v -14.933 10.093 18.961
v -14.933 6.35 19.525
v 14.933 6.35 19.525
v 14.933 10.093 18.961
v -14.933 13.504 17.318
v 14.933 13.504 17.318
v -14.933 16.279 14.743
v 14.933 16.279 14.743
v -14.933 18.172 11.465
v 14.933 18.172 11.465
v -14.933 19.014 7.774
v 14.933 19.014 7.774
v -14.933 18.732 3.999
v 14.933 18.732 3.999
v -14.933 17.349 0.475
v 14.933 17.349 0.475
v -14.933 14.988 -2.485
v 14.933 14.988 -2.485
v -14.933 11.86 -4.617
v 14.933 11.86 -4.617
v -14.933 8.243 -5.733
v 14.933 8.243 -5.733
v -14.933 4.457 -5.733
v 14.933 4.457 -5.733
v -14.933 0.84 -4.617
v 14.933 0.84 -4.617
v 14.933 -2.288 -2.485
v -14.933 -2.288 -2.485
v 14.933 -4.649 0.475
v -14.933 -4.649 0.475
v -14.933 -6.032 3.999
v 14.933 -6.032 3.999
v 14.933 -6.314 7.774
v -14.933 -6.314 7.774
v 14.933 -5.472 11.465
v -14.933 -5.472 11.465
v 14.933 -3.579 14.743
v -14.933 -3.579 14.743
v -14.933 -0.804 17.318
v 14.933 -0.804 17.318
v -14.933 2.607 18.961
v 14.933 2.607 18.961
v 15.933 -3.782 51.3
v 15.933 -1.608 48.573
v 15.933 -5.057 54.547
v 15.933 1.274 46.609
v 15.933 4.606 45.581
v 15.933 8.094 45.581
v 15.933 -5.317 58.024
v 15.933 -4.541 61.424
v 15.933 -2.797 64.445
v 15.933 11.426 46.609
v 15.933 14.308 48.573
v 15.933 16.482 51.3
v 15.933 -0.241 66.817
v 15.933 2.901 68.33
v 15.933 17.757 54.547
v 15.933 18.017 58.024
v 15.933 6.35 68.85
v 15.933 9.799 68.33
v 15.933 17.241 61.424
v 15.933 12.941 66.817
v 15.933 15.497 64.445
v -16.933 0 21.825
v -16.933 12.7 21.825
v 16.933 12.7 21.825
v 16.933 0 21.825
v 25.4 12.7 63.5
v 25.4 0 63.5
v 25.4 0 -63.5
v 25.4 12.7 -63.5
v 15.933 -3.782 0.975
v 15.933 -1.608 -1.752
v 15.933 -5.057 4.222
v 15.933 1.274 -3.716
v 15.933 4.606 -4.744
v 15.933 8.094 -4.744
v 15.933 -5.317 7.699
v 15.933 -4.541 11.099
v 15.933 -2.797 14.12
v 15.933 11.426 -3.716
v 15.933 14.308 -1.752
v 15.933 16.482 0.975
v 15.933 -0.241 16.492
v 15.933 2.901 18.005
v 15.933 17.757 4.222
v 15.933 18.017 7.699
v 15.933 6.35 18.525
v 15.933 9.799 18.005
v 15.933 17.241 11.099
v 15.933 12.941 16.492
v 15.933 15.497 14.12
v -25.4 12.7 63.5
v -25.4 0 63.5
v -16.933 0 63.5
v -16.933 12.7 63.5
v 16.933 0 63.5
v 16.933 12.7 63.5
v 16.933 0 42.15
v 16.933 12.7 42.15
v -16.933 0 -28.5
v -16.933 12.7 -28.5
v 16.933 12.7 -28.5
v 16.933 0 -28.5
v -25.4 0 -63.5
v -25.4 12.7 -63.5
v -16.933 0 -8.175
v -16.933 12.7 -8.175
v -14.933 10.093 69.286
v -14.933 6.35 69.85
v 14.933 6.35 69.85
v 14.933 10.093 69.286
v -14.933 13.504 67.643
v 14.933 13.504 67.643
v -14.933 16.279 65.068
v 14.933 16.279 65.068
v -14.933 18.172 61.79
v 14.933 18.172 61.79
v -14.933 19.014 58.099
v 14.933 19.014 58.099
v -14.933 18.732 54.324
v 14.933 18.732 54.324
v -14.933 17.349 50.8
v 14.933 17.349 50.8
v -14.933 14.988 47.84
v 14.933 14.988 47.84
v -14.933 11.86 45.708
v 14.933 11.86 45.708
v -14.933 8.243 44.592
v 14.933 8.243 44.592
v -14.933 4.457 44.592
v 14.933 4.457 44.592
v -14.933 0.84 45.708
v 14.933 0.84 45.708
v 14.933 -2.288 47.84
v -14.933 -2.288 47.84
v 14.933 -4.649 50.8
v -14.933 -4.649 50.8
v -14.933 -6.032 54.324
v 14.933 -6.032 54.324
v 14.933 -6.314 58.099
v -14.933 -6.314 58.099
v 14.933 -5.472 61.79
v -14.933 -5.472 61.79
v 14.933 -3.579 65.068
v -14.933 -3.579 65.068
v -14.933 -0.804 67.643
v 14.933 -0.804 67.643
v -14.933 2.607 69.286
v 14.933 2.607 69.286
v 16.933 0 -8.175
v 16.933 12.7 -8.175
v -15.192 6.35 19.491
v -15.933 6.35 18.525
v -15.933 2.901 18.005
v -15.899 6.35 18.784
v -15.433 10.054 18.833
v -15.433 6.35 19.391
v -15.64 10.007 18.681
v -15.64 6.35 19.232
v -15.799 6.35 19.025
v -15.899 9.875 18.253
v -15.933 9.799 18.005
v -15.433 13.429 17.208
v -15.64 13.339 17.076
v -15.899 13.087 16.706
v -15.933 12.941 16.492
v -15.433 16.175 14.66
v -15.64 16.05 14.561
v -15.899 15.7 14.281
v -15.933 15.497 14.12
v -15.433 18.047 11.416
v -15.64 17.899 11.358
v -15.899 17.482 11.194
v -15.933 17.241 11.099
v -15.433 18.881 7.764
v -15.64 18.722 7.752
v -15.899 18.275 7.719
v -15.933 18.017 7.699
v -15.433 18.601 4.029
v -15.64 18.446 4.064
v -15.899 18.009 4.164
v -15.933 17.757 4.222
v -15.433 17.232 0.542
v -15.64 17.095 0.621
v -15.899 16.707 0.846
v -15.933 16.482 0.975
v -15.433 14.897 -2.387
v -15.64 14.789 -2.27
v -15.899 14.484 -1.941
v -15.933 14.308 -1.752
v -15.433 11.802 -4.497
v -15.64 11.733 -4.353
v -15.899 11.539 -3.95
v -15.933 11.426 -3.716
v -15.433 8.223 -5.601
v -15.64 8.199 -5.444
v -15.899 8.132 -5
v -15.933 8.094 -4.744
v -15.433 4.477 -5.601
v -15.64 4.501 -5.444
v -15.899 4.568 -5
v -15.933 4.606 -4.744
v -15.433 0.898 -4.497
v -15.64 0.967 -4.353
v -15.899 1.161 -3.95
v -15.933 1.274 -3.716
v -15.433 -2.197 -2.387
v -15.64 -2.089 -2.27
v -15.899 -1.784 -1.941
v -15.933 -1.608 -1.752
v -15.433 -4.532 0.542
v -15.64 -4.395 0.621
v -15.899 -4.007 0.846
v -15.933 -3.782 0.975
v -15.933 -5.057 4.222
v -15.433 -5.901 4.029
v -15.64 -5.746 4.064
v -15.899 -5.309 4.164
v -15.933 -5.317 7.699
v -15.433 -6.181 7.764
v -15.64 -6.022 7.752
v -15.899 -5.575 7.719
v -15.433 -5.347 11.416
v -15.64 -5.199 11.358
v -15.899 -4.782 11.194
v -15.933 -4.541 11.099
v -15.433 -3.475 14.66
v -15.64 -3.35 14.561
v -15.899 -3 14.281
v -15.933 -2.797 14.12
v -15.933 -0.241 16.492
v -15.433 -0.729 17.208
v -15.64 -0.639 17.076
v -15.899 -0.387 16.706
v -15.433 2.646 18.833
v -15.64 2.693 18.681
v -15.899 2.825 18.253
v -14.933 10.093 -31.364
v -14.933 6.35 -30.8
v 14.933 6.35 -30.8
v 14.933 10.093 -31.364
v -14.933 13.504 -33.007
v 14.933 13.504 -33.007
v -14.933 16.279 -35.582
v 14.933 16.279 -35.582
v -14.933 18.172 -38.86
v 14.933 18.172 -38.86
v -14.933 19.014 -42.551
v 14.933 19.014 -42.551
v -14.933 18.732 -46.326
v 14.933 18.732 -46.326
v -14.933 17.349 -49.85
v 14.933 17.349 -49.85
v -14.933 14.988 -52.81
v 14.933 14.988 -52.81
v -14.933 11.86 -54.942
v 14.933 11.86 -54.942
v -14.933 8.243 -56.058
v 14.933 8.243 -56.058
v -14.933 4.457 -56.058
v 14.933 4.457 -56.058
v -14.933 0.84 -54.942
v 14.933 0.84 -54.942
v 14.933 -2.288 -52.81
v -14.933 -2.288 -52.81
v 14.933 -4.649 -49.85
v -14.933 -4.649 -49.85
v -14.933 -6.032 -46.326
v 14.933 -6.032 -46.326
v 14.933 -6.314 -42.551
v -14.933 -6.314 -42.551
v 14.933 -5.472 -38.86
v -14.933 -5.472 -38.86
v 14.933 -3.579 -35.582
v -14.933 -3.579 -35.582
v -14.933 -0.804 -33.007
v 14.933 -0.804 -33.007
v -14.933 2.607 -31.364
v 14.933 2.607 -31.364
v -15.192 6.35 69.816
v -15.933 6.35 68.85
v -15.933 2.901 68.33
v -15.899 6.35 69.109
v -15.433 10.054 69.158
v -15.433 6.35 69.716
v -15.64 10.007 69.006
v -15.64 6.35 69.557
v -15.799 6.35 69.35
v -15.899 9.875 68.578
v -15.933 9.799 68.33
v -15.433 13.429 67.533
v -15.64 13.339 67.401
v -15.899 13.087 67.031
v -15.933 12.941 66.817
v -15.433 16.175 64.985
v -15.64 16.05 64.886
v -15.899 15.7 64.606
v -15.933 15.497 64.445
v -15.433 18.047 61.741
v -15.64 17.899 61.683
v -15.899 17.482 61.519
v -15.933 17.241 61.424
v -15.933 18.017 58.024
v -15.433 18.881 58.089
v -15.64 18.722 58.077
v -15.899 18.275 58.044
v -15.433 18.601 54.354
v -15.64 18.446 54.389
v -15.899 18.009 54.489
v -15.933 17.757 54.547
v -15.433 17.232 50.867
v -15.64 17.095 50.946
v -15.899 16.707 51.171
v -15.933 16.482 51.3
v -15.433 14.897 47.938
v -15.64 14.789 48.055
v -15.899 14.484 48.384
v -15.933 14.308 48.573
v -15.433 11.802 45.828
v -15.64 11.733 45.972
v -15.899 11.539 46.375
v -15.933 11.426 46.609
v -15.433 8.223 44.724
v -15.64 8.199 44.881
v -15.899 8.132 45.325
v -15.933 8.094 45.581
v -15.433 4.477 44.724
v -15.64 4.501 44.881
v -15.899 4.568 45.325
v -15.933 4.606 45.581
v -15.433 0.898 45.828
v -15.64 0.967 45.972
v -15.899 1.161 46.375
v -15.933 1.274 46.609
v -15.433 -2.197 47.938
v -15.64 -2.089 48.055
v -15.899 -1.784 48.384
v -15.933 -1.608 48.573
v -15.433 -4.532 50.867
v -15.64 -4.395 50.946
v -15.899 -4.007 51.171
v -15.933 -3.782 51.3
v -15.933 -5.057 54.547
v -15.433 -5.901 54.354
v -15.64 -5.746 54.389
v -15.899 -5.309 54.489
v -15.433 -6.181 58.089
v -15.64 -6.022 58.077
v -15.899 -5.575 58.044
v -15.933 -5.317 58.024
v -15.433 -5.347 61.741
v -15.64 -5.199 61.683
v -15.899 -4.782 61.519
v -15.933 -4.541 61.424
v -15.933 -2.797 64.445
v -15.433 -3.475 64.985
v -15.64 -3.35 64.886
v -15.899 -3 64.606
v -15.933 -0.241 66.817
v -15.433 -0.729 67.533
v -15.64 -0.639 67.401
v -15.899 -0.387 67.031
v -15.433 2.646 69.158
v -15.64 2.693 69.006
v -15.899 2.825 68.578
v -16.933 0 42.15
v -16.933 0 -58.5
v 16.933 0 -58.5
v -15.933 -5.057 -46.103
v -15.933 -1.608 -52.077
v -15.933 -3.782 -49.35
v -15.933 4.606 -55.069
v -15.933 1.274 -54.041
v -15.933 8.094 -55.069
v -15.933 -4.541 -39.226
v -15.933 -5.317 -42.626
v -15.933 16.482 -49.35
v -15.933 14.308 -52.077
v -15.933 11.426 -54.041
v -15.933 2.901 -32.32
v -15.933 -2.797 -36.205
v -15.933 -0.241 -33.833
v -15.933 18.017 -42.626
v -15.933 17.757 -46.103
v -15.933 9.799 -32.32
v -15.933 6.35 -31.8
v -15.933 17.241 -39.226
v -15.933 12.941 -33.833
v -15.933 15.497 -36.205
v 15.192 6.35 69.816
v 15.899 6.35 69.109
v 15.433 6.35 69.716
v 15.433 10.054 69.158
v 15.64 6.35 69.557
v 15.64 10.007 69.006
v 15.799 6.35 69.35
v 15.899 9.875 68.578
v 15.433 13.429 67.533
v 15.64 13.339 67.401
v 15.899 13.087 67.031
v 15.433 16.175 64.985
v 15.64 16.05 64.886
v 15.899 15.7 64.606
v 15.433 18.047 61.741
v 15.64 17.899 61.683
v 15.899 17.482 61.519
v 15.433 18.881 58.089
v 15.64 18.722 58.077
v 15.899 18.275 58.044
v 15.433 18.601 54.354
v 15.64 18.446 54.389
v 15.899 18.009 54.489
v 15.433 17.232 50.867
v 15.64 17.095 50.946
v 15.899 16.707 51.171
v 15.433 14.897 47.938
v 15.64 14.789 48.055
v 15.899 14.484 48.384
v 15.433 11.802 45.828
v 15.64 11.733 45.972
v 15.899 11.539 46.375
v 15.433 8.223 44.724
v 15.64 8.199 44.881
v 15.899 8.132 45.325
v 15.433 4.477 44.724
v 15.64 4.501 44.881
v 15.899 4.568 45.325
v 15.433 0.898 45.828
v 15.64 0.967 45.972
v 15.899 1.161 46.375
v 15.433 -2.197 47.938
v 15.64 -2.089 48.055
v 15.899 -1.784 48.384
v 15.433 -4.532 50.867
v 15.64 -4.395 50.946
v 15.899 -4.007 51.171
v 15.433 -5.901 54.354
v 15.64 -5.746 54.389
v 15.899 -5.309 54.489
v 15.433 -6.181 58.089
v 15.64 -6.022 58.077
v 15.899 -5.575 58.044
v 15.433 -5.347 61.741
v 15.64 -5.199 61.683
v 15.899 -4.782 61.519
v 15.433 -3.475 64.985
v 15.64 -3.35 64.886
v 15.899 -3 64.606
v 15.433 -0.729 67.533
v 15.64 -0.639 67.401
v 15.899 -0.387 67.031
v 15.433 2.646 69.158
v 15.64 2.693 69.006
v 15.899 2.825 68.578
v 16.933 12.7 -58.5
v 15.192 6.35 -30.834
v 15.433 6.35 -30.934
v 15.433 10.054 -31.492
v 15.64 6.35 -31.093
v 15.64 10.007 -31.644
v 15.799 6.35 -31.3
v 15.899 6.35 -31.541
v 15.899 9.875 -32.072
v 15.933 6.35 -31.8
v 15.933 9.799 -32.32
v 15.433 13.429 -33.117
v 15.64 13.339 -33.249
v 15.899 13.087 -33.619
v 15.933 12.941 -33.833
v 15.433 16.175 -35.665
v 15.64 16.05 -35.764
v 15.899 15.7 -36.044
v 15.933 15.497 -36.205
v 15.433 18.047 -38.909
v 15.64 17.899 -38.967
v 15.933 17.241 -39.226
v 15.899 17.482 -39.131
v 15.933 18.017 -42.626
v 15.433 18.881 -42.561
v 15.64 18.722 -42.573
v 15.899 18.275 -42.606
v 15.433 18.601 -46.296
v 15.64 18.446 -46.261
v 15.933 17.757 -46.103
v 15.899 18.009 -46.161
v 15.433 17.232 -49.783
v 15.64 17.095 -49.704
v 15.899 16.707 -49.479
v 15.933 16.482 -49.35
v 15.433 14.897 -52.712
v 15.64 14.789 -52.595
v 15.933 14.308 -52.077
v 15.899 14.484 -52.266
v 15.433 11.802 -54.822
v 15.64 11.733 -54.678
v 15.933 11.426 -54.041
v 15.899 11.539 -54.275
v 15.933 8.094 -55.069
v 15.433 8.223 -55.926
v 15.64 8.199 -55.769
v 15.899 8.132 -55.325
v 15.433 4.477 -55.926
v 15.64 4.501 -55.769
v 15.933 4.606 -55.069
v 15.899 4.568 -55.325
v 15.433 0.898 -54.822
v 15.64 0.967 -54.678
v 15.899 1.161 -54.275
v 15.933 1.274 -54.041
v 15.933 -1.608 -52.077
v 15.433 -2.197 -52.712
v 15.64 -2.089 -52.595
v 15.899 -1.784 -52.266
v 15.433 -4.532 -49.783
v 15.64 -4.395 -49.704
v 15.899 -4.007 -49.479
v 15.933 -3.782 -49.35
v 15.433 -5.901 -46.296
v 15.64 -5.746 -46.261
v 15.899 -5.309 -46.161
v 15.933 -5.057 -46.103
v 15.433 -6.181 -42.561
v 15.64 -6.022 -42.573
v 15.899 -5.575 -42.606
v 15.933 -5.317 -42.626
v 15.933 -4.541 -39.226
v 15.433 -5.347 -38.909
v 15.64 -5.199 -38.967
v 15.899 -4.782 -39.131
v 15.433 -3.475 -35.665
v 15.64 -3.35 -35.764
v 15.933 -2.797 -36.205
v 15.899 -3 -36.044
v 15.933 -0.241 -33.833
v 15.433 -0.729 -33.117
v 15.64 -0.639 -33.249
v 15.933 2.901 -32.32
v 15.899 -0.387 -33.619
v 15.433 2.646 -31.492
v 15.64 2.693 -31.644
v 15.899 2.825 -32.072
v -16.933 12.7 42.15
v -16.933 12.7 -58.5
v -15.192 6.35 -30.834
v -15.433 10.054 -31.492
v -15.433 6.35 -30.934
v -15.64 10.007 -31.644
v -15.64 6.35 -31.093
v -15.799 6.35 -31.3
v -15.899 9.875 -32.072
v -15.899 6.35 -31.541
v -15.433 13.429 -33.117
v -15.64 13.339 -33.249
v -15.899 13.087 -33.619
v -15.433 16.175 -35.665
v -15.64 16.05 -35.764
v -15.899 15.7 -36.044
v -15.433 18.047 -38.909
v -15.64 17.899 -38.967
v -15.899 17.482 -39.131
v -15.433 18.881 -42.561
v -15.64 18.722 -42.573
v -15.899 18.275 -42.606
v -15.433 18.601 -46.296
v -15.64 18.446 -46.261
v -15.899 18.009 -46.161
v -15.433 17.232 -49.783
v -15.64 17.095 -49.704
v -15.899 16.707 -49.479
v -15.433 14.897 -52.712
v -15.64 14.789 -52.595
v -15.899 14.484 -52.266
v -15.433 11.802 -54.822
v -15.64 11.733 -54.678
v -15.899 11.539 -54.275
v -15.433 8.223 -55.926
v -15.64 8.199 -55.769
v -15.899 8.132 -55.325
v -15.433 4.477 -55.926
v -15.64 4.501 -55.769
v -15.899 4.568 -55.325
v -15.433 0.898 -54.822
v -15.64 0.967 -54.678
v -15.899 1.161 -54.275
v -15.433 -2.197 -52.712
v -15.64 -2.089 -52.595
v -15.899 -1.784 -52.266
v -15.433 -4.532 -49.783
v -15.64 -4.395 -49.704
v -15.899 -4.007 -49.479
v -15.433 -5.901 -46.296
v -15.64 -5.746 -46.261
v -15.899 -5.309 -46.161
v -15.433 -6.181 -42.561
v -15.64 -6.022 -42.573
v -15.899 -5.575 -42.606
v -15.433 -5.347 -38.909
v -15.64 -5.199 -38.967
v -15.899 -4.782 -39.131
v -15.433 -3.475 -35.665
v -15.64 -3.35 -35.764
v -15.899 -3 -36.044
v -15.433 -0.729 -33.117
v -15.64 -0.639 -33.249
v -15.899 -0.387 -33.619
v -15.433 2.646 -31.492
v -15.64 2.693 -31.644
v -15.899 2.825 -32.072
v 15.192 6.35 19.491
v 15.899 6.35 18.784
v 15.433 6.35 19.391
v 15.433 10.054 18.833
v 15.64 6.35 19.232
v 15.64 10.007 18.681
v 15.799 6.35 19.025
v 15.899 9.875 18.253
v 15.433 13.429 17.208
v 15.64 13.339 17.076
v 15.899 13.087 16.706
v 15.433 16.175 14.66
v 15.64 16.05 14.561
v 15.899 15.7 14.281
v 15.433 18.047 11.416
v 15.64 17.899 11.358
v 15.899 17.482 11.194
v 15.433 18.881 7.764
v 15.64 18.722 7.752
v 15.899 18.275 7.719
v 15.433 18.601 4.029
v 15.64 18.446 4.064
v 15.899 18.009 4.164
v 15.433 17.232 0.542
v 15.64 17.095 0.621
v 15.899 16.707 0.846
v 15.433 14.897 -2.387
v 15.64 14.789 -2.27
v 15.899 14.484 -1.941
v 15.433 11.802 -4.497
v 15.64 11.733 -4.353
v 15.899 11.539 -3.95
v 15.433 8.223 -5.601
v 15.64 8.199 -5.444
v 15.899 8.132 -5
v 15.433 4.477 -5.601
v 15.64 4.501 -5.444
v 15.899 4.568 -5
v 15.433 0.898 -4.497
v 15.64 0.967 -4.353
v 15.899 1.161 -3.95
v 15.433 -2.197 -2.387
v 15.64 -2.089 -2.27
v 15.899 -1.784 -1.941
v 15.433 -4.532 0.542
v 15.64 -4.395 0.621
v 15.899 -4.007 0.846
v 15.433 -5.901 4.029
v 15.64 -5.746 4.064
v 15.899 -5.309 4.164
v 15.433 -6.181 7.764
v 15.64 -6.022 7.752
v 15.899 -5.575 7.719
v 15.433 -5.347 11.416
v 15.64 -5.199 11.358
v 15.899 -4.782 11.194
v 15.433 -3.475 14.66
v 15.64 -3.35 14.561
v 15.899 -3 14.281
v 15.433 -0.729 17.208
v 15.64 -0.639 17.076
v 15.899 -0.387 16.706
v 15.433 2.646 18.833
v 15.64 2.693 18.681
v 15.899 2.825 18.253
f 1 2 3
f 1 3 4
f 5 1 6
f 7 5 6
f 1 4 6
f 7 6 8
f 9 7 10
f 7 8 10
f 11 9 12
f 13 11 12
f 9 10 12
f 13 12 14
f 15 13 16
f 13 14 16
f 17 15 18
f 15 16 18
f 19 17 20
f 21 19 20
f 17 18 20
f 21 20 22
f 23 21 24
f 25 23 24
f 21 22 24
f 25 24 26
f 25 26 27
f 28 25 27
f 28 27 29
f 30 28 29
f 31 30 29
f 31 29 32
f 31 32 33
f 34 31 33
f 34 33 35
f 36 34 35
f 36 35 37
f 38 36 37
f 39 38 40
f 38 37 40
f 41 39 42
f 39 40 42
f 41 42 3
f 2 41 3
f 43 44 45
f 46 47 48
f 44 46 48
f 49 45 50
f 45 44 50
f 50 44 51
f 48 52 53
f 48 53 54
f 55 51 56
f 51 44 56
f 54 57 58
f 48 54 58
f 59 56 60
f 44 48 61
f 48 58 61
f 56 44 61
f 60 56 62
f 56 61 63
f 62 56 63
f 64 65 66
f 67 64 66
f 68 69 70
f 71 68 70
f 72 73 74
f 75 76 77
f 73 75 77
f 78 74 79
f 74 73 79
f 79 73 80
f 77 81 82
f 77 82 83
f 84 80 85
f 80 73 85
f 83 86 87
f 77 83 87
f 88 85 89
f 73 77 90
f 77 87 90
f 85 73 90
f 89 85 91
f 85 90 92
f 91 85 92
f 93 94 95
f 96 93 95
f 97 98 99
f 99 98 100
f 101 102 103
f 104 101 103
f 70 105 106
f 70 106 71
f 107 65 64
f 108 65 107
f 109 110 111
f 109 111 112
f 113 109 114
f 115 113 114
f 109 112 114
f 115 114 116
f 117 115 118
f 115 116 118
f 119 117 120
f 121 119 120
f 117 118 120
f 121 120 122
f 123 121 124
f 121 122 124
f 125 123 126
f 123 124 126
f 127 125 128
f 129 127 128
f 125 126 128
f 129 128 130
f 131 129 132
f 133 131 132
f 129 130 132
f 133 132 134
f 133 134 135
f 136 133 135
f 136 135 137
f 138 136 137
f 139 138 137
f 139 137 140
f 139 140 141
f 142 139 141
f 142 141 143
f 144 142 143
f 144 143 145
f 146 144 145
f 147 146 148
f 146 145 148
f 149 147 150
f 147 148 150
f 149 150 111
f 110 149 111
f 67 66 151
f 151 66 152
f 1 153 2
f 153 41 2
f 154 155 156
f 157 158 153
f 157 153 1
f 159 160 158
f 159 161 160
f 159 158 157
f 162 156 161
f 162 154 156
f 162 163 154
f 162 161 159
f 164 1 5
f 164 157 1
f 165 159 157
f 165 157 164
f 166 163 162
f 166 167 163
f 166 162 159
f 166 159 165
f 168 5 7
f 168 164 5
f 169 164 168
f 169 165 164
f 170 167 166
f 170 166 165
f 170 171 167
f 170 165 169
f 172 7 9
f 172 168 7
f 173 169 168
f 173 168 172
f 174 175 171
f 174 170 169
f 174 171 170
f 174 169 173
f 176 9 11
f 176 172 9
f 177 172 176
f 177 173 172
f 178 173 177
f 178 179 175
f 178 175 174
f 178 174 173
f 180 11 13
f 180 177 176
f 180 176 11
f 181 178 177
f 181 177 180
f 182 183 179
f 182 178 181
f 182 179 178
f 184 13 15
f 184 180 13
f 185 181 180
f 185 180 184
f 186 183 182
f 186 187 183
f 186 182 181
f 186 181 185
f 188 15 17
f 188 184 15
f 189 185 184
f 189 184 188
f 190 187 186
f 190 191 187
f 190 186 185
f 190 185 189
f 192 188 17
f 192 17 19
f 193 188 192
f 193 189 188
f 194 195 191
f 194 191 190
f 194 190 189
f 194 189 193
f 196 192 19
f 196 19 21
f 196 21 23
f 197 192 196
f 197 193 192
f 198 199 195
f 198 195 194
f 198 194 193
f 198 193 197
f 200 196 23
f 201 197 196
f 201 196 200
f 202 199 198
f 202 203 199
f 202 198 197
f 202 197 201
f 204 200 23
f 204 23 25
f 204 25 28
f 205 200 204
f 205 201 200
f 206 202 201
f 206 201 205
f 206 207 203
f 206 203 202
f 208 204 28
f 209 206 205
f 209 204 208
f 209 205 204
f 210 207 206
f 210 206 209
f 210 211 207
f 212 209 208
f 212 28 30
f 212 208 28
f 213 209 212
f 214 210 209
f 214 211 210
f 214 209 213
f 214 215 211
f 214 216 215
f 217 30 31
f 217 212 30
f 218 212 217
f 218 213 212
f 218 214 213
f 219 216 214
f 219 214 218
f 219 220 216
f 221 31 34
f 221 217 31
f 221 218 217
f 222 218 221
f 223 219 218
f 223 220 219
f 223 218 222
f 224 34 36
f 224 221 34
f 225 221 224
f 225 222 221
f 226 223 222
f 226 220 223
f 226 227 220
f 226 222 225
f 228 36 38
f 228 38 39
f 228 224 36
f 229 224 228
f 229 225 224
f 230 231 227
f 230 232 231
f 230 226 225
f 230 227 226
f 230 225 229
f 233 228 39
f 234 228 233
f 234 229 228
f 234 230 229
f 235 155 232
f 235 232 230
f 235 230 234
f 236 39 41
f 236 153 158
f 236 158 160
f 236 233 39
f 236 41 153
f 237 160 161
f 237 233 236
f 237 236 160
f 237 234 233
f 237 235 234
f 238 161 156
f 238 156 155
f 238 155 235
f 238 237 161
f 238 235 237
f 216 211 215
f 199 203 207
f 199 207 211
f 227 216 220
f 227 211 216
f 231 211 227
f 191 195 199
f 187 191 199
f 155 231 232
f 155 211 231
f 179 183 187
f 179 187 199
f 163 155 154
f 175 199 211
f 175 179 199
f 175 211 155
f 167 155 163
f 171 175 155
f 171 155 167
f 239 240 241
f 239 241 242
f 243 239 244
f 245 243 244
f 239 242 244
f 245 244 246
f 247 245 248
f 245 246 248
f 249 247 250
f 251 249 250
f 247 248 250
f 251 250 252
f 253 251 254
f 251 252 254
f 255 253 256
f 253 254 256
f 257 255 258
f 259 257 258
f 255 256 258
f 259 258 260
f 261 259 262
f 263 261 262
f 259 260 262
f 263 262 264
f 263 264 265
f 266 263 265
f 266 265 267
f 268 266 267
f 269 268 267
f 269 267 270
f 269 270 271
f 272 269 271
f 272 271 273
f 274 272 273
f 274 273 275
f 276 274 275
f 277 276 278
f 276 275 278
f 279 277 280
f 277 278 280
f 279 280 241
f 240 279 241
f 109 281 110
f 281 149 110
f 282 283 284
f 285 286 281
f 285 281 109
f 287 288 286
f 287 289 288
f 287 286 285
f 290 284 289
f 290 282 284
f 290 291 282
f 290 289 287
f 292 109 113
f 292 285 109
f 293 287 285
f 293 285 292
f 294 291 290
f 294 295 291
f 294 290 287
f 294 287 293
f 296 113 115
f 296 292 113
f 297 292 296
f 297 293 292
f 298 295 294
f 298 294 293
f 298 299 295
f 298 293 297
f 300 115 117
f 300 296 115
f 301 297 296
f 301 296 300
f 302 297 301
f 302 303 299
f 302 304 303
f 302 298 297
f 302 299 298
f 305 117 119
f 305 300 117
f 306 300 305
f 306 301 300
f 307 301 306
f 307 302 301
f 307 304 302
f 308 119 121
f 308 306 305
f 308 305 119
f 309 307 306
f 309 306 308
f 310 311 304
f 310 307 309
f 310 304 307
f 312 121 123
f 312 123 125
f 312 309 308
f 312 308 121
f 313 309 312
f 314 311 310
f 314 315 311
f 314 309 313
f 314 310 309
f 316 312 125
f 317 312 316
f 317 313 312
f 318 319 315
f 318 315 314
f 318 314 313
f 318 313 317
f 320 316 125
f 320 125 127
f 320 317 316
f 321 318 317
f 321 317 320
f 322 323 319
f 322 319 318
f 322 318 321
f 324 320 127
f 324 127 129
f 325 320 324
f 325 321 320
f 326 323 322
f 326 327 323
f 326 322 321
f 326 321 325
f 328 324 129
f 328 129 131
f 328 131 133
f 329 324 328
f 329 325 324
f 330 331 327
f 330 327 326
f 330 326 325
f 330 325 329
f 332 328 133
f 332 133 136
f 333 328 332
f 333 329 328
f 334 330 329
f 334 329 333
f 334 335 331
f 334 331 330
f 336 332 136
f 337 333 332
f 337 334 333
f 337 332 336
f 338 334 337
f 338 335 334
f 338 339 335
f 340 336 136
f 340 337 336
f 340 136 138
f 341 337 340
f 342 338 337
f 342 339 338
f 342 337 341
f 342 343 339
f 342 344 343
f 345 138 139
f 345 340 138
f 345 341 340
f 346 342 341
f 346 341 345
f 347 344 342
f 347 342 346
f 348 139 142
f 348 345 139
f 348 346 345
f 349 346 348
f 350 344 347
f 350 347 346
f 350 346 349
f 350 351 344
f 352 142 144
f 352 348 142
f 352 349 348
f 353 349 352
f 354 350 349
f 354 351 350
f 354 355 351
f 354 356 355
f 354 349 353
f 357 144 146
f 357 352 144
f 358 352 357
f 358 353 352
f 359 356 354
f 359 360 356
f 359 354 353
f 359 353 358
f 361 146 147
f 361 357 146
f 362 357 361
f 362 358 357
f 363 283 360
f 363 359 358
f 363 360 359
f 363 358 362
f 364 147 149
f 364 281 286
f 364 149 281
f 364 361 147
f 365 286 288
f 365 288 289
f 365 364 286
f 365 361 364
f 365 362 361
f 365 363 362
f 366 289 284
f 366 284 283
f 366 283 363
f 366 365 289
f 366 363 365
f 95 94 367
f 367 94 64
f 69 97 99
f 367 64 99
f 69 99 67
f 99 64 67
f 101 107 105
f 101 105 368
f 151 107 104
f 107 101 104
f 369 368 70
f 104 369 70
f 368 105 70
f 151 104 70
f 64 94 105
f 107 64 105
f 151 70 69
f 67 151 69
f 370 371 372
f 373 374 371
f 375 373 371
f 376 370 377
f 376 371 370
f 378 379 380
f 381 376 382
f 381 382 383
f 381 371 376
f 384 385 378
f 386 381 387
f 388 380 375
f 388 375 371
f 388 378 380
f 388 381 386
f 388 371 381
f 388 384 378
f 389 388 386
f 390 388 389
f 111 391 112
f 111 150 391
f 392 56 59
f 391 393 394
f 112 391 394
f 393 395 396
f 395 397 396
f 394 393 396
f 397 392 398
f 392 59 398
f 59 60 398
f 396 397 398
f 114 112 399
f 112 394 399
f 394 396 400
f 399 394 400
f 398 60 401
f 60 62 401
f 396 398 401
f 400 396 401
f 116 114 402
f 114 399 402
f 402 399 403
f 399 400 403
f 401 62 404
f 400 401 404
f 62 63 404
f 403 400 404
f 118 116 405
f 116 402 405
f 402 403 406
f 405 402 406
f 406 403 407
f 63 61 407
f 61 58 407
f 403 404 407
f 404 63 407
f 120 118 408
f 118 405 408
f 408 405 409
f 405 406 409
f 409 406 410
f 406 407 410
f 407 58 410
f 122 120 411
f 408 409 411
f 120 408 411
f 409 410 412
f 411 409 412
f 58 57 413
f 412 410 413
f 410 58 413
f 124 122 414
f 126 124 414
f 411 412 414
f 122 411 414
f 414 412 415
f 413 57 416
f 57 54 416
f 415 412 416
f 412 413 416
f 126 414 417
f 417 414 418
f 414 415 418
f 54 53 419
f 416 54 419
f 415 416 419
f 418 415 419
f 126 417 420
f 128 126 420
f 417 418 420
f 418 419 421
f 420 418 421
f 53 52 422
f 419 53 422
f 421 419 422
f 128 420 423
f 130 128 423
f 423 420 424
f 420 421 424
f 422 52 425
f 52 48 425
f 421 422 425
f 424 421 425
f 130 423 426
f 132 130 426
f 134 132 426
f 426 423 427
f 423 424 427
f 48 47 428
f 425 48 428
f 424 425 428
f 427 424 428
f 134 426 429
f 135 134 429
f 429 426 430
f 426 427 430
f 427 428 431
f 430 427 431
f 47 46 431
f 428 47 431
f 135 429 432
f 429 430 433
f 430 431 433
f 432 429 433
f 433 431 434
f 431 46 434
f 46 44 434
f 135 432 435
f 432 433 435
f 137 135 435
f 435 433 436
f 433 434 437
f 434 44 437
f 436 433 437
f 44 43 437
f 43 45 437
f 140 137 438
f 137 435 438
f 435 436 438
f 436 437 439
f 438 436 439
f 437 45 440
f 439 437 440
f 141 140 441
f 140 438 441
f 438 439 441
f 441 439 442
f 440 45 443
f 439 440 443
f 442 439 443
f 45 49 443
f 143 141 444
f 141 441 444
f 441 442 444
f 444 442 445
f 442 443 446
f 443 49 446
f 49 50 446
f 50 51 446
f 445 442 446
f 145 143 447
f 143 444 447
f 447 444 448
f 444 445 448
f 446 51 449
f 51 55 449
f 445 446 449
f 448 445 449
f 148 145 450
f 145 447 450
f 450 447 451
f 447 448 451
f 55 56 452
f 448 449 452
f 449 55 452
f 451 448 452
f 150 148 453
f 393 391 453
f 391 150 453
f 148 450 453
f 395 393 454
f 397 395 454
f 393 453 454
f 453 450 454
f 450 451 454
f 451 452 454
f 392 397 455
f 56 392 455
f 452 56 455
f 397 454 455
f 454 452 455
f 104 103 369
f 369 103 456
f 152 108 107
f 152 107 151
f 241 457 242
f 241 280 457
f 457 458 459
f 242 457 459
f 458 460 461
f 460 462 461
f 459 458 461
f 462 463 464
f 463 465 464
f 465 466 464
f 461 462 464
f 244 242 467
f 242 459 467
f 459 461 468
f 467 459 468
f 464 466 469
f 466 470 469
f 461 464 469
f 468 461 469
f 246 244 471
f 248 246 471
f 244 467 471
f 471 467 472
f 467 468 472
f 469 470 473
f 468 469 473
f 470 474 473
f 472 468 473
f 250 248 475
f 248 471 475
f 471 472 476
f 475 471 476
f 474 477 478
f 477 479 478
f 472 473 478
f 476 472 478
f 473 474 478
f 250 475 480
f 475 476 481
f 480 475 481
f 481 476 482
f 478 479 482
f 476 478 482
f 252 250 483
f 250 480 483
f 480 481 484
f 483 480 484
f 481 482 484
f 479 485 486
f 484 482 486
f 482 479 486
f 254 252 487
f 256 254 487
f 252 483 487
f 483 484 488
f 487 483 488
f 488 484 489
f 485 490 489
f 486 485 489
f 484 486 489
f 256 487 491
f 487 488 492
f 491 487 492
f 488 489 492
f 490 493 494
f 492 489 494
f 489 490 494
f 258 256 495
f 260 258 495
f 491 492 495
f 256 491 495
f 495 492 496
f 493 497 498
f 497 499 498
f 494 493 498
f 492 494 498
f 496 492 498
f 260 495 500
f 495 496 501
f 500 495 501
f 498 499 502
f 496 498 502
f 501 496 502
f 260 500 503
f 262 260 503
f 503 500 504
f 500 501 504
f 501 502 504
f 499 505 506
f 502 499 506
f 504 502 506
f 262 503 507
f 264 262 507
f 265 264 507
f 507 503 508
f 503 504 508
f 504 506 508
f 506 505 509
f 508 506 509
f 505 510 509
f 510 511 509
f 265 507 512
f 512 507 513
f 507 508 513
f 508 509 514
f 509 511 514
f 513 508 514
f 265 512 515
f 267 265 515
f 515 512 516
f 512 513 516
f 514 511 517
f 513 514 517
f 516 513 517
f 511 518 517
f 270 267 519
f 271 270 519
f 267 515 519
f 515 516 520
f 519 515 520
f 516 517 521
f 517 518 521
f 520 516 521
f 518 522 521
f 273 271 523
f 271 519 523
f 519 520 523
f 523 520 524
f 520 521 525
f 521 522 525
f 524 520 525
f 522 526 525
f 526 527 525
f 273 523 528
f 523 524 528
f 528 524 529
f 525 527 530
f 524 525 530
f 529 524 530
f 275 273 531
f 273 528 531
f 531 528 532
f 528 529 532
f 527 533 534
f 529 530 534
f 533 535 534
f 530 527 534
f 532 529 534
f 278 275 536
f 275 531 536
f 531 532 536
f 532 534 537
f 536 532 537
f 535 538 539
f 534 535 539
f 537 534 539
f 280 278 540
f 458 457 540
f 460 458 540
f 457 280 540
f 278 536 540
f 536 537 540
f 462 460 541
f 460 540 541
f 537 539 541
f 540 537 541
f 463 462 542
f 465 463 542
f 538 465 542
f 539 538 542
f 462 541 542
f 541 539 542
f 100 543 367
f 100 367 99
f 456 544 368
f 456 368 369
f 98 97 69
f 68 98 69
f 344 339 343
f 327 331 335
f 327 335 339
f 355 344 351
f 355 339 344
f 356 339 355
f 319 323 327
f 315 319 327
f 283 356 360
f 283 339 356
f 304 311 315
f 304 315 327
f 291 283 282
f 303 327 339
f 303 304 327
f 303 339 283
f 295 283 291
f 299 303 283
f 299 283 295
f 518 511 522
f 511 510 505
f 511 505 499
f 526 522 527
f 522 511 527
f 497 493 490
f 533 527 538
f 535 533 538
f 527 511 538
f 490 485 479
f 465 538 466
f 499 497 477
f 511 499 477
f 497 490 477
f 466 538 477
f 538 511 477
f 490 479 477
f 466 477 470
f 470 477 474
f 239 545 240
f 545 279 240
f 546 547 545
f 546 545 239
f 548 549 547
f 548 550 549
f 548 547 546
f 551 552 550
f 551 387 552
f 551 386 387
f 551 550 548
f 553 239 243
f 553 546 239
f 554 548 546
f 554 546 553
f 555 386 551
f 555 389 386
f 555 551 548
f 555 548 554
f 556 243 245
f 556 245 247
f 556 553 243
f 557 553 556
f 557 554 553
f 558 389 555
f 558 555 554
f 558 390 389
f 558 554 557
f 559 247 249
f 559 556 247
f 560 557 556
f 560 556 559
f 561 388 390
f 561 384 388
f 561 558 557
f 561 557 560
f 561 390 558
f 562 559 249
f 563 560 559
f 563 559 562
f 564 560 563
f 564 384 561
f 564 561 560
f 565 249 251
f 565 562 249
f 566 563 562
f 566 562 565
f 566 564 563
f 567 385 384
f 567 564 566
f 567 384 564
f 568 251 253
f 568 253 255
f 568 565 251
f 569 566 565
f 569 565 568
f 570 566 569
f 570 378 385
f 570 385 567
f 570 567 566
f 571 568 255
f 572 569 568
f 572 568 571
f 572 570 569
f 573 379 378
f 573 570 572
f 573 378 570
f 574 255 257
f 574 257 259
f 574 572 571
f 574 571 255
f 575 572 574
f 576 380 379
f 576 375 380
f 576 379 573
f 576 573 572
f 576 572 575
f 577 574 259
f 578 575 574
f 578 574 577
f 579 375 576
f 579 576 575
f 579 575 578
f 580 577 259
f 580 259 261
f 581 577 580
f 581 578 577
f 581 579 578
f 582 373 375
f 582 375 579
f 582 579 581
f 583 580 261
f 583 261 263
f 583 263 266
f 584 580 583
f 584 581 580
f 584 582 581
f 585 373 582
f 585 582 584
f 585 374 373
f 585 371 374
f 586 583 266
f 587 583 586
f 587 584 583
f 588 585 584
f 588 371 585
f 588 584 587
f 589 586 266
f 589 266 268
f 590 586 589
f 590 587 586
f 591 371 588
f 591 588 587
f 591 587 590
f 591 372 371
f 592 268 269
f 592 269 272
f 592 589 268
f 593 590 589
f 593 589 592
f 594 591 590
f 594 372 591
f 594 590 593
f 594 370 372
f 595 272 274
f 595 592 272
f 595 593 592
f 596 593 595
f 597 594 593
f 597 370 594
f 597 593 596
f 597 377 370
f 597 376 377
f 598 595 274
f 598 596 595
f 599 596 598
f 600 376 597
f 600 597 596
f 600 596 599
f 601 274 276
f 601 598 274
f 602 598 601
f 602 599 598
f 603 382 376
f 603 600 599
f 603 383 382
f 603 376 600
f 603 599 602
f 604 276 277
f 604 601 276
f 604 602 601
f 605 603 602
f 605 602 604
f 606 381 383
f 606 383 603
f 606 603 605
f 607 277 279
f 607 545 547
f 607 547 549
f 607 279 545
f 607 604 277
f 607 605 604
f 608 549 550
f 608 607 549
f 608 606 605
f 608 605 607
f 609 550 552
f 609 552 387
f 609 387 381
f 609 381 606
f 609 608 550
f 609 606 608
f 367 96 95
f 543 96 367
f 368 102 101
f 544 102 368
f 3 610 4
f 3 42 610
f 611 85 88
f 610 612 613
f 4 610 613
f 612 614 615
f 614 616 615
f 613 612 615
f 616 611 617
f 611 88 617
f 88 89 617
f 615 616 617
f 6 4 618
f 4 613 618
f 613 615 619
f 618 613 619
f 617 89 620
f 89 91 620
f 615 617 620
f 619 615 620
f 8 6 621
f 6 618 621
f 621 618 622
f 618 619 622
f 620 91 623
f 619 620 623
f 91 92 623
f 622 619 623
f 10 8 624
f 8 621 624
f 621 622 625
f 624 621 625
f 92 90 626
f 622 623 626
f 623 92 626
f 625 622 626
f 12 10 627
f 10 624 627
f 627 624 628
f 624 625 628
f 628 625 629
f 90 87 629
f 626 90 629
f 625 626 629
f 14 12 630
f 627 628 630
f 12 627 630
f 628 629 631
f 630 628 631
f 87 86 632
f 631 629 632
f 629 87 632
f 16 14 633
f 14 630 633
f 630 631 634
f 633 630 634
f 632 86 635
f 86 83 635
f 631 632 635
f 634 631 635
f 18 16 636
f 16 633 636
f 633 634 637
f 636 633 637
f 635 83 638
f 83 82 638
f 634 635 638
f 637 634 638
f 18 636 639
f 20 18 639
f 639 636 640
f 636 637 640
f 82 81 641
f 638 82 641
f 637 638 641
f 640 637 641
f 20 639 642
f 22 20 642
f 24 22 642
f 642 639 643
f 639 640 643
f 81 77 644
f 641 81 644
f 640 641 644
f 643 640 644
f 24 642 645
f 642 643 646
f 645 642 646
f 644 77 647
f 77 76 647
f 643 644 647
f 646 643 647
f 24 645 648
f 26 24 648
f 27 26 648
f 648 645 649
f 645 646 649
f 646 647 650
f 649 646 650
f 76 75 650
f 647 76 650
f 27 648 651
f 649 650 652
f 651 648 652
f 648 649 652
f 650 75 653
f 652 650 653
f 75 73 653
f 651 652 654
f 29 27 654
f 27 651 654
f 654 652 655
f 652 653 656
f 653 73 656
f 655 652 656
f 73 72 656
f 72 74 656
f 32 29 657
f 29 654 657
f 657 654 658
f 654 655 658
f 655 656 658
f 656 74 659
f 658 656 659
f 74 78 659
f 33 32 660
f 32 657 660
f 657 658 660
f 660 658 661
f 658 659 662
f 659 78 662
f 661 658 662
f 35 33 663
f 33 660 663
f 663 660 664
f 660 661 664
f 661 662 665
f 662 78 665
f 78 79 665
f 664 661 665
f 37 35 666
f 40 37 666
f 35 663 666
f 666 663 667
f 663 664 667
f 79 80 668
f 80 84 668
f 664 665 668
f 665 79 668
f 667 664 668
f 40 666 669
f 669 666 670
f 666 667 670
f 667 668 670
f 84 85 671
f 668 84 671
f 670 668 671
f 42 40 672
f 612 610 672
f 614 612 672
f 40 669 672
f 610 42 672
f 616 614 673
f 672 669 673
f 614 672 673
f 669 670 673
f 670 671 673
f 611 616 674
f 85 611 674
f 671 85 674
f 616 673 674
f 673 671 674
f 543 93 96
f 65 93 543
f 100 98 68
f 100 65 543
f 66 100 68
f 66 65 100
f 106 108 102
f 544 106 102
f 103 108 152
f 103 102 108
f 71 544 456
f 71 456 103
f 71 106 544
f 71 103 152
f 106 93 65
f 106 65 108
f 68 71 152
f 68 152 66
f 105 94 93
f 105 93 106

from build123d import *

# Parameters (mm, degrees)
SKETCH1_W             = 50.8
SKETCH1_H             = 127
BOSS_EXTRUDE1_DEPTH   = 12.7
SKETCH3_W             = 33.866666666
SKETCH3_H             = 21.35
SKETCH3_H_2           = 30
CUT_EXTRUDE1_DEPTH    = 12.7
SKETCH5_R             = 12.7
BOSS_EXTRUDE2_DEPTH   = 31.866667
BOSS_EXTRUDE2_2_DEPTH = 31.866667
BOSS_EXTRUDE2_3_DEPTH = 31.866667
FILLET1_R             = 1
FILLET2_R             = 1
FILLET3_R             = 1


with BuildPart() as part:
    # Sketch1 → Boss-Extrude1 (new body)
    with BuildSketch(Plane(origin=(0, 0, 0), x_dir=(1, 0, 0), z_dir=(0, 1, 0))):
        Rectangle(SKETCH1_W, SKETCH1_H)
    extrude(amount=BOSS_EXTRUDE1_DEPTH)

    # Sketch3 → Cut-Extrude1 (cut)
    with BuildSketch(Plane(origin=(0, 12.7, 0), x_dir=(1, 0, 0), z_dir=(0, 1, 0))):
        with Locations((0, -52.825)):
            Rectangle(SKETCH3_W, SKETCH3_H)
        with Locations((0, -6.825)):
            Rectangle(SKETCH3_W, SKETCH3_H_2)
        with Locations((0, 43.5)):
            Rectangle(SKETCH3_W, SKETCH3_H_2)
    extrude(amount=-CUT_EXTRUDE1_DEPTH, mode=Mode.SUBTRACT)


with BuildPart() as body_2:
    # Sketch5 → Boss-Extrude2 (new body)
    with BuildSketch(Plane.ZY.offset(-15.933333333)):
        with Locations((6.825, 6.35)):
            Circle(SKETCH5_R)
    extrude(amount=BOSS_EXTRUDE2_DEPTH)

    # Fillet1
    fillet1_edges = [body_2.edges().sort_by_distance(p)[0] for p in [
        (15.933333333, 6.35, -5.875),
        (-15.933333667, 6.35, -5.875),
    ]]
    fillet(fillet1_edges, radius=FILLET1_R)


with BuildPart() as body_3:
    # Sketch5 → Boss-Extrude2 2 (new body)
    with BuildSketch(Plane.ZY.offset(-15.933333333)):
        with Locations((-43.5, 6.35)):
            Circle(SKETCH5_R)
    extrude(amount=BOSS_EXTRUDE2_2_DEPTH)

    # Fillet2
    fillet2_edges = [body_3.edges().sort_by_distance(p)[0] for p in [
        (15.933333333, 6.35, -56.2),
        (-15.933333667, 6.35, -56.2),
    ]]
    fillet(fillet2_edges, radius=FILLET2_R)


with BuildPart() as body_4:
    # Sketch5 → Boss-Extrude2 3 (new body)
    with BuildSketch(Plane.ZY.offset(-15.933333333)):
        with Locations((57.15, 6.35)):
            Circle(SKETCH5_R)
    extrude(amount=BOSS_EXTRUDE2_3_DEPTH)

    # Fillet3
    fillet3_edges = [body_4.edges().sort_by_distance(p)[0] for p in [
        (15.933333333, 6.35, 44.45),
        (-15.933333667, 6.35, 44.45),
    ]]
    fillet(fillet3_edges, radius=FILLET3_R)


solid = Compound([part.part, body_2.part, body_3.part, body_4.part])
